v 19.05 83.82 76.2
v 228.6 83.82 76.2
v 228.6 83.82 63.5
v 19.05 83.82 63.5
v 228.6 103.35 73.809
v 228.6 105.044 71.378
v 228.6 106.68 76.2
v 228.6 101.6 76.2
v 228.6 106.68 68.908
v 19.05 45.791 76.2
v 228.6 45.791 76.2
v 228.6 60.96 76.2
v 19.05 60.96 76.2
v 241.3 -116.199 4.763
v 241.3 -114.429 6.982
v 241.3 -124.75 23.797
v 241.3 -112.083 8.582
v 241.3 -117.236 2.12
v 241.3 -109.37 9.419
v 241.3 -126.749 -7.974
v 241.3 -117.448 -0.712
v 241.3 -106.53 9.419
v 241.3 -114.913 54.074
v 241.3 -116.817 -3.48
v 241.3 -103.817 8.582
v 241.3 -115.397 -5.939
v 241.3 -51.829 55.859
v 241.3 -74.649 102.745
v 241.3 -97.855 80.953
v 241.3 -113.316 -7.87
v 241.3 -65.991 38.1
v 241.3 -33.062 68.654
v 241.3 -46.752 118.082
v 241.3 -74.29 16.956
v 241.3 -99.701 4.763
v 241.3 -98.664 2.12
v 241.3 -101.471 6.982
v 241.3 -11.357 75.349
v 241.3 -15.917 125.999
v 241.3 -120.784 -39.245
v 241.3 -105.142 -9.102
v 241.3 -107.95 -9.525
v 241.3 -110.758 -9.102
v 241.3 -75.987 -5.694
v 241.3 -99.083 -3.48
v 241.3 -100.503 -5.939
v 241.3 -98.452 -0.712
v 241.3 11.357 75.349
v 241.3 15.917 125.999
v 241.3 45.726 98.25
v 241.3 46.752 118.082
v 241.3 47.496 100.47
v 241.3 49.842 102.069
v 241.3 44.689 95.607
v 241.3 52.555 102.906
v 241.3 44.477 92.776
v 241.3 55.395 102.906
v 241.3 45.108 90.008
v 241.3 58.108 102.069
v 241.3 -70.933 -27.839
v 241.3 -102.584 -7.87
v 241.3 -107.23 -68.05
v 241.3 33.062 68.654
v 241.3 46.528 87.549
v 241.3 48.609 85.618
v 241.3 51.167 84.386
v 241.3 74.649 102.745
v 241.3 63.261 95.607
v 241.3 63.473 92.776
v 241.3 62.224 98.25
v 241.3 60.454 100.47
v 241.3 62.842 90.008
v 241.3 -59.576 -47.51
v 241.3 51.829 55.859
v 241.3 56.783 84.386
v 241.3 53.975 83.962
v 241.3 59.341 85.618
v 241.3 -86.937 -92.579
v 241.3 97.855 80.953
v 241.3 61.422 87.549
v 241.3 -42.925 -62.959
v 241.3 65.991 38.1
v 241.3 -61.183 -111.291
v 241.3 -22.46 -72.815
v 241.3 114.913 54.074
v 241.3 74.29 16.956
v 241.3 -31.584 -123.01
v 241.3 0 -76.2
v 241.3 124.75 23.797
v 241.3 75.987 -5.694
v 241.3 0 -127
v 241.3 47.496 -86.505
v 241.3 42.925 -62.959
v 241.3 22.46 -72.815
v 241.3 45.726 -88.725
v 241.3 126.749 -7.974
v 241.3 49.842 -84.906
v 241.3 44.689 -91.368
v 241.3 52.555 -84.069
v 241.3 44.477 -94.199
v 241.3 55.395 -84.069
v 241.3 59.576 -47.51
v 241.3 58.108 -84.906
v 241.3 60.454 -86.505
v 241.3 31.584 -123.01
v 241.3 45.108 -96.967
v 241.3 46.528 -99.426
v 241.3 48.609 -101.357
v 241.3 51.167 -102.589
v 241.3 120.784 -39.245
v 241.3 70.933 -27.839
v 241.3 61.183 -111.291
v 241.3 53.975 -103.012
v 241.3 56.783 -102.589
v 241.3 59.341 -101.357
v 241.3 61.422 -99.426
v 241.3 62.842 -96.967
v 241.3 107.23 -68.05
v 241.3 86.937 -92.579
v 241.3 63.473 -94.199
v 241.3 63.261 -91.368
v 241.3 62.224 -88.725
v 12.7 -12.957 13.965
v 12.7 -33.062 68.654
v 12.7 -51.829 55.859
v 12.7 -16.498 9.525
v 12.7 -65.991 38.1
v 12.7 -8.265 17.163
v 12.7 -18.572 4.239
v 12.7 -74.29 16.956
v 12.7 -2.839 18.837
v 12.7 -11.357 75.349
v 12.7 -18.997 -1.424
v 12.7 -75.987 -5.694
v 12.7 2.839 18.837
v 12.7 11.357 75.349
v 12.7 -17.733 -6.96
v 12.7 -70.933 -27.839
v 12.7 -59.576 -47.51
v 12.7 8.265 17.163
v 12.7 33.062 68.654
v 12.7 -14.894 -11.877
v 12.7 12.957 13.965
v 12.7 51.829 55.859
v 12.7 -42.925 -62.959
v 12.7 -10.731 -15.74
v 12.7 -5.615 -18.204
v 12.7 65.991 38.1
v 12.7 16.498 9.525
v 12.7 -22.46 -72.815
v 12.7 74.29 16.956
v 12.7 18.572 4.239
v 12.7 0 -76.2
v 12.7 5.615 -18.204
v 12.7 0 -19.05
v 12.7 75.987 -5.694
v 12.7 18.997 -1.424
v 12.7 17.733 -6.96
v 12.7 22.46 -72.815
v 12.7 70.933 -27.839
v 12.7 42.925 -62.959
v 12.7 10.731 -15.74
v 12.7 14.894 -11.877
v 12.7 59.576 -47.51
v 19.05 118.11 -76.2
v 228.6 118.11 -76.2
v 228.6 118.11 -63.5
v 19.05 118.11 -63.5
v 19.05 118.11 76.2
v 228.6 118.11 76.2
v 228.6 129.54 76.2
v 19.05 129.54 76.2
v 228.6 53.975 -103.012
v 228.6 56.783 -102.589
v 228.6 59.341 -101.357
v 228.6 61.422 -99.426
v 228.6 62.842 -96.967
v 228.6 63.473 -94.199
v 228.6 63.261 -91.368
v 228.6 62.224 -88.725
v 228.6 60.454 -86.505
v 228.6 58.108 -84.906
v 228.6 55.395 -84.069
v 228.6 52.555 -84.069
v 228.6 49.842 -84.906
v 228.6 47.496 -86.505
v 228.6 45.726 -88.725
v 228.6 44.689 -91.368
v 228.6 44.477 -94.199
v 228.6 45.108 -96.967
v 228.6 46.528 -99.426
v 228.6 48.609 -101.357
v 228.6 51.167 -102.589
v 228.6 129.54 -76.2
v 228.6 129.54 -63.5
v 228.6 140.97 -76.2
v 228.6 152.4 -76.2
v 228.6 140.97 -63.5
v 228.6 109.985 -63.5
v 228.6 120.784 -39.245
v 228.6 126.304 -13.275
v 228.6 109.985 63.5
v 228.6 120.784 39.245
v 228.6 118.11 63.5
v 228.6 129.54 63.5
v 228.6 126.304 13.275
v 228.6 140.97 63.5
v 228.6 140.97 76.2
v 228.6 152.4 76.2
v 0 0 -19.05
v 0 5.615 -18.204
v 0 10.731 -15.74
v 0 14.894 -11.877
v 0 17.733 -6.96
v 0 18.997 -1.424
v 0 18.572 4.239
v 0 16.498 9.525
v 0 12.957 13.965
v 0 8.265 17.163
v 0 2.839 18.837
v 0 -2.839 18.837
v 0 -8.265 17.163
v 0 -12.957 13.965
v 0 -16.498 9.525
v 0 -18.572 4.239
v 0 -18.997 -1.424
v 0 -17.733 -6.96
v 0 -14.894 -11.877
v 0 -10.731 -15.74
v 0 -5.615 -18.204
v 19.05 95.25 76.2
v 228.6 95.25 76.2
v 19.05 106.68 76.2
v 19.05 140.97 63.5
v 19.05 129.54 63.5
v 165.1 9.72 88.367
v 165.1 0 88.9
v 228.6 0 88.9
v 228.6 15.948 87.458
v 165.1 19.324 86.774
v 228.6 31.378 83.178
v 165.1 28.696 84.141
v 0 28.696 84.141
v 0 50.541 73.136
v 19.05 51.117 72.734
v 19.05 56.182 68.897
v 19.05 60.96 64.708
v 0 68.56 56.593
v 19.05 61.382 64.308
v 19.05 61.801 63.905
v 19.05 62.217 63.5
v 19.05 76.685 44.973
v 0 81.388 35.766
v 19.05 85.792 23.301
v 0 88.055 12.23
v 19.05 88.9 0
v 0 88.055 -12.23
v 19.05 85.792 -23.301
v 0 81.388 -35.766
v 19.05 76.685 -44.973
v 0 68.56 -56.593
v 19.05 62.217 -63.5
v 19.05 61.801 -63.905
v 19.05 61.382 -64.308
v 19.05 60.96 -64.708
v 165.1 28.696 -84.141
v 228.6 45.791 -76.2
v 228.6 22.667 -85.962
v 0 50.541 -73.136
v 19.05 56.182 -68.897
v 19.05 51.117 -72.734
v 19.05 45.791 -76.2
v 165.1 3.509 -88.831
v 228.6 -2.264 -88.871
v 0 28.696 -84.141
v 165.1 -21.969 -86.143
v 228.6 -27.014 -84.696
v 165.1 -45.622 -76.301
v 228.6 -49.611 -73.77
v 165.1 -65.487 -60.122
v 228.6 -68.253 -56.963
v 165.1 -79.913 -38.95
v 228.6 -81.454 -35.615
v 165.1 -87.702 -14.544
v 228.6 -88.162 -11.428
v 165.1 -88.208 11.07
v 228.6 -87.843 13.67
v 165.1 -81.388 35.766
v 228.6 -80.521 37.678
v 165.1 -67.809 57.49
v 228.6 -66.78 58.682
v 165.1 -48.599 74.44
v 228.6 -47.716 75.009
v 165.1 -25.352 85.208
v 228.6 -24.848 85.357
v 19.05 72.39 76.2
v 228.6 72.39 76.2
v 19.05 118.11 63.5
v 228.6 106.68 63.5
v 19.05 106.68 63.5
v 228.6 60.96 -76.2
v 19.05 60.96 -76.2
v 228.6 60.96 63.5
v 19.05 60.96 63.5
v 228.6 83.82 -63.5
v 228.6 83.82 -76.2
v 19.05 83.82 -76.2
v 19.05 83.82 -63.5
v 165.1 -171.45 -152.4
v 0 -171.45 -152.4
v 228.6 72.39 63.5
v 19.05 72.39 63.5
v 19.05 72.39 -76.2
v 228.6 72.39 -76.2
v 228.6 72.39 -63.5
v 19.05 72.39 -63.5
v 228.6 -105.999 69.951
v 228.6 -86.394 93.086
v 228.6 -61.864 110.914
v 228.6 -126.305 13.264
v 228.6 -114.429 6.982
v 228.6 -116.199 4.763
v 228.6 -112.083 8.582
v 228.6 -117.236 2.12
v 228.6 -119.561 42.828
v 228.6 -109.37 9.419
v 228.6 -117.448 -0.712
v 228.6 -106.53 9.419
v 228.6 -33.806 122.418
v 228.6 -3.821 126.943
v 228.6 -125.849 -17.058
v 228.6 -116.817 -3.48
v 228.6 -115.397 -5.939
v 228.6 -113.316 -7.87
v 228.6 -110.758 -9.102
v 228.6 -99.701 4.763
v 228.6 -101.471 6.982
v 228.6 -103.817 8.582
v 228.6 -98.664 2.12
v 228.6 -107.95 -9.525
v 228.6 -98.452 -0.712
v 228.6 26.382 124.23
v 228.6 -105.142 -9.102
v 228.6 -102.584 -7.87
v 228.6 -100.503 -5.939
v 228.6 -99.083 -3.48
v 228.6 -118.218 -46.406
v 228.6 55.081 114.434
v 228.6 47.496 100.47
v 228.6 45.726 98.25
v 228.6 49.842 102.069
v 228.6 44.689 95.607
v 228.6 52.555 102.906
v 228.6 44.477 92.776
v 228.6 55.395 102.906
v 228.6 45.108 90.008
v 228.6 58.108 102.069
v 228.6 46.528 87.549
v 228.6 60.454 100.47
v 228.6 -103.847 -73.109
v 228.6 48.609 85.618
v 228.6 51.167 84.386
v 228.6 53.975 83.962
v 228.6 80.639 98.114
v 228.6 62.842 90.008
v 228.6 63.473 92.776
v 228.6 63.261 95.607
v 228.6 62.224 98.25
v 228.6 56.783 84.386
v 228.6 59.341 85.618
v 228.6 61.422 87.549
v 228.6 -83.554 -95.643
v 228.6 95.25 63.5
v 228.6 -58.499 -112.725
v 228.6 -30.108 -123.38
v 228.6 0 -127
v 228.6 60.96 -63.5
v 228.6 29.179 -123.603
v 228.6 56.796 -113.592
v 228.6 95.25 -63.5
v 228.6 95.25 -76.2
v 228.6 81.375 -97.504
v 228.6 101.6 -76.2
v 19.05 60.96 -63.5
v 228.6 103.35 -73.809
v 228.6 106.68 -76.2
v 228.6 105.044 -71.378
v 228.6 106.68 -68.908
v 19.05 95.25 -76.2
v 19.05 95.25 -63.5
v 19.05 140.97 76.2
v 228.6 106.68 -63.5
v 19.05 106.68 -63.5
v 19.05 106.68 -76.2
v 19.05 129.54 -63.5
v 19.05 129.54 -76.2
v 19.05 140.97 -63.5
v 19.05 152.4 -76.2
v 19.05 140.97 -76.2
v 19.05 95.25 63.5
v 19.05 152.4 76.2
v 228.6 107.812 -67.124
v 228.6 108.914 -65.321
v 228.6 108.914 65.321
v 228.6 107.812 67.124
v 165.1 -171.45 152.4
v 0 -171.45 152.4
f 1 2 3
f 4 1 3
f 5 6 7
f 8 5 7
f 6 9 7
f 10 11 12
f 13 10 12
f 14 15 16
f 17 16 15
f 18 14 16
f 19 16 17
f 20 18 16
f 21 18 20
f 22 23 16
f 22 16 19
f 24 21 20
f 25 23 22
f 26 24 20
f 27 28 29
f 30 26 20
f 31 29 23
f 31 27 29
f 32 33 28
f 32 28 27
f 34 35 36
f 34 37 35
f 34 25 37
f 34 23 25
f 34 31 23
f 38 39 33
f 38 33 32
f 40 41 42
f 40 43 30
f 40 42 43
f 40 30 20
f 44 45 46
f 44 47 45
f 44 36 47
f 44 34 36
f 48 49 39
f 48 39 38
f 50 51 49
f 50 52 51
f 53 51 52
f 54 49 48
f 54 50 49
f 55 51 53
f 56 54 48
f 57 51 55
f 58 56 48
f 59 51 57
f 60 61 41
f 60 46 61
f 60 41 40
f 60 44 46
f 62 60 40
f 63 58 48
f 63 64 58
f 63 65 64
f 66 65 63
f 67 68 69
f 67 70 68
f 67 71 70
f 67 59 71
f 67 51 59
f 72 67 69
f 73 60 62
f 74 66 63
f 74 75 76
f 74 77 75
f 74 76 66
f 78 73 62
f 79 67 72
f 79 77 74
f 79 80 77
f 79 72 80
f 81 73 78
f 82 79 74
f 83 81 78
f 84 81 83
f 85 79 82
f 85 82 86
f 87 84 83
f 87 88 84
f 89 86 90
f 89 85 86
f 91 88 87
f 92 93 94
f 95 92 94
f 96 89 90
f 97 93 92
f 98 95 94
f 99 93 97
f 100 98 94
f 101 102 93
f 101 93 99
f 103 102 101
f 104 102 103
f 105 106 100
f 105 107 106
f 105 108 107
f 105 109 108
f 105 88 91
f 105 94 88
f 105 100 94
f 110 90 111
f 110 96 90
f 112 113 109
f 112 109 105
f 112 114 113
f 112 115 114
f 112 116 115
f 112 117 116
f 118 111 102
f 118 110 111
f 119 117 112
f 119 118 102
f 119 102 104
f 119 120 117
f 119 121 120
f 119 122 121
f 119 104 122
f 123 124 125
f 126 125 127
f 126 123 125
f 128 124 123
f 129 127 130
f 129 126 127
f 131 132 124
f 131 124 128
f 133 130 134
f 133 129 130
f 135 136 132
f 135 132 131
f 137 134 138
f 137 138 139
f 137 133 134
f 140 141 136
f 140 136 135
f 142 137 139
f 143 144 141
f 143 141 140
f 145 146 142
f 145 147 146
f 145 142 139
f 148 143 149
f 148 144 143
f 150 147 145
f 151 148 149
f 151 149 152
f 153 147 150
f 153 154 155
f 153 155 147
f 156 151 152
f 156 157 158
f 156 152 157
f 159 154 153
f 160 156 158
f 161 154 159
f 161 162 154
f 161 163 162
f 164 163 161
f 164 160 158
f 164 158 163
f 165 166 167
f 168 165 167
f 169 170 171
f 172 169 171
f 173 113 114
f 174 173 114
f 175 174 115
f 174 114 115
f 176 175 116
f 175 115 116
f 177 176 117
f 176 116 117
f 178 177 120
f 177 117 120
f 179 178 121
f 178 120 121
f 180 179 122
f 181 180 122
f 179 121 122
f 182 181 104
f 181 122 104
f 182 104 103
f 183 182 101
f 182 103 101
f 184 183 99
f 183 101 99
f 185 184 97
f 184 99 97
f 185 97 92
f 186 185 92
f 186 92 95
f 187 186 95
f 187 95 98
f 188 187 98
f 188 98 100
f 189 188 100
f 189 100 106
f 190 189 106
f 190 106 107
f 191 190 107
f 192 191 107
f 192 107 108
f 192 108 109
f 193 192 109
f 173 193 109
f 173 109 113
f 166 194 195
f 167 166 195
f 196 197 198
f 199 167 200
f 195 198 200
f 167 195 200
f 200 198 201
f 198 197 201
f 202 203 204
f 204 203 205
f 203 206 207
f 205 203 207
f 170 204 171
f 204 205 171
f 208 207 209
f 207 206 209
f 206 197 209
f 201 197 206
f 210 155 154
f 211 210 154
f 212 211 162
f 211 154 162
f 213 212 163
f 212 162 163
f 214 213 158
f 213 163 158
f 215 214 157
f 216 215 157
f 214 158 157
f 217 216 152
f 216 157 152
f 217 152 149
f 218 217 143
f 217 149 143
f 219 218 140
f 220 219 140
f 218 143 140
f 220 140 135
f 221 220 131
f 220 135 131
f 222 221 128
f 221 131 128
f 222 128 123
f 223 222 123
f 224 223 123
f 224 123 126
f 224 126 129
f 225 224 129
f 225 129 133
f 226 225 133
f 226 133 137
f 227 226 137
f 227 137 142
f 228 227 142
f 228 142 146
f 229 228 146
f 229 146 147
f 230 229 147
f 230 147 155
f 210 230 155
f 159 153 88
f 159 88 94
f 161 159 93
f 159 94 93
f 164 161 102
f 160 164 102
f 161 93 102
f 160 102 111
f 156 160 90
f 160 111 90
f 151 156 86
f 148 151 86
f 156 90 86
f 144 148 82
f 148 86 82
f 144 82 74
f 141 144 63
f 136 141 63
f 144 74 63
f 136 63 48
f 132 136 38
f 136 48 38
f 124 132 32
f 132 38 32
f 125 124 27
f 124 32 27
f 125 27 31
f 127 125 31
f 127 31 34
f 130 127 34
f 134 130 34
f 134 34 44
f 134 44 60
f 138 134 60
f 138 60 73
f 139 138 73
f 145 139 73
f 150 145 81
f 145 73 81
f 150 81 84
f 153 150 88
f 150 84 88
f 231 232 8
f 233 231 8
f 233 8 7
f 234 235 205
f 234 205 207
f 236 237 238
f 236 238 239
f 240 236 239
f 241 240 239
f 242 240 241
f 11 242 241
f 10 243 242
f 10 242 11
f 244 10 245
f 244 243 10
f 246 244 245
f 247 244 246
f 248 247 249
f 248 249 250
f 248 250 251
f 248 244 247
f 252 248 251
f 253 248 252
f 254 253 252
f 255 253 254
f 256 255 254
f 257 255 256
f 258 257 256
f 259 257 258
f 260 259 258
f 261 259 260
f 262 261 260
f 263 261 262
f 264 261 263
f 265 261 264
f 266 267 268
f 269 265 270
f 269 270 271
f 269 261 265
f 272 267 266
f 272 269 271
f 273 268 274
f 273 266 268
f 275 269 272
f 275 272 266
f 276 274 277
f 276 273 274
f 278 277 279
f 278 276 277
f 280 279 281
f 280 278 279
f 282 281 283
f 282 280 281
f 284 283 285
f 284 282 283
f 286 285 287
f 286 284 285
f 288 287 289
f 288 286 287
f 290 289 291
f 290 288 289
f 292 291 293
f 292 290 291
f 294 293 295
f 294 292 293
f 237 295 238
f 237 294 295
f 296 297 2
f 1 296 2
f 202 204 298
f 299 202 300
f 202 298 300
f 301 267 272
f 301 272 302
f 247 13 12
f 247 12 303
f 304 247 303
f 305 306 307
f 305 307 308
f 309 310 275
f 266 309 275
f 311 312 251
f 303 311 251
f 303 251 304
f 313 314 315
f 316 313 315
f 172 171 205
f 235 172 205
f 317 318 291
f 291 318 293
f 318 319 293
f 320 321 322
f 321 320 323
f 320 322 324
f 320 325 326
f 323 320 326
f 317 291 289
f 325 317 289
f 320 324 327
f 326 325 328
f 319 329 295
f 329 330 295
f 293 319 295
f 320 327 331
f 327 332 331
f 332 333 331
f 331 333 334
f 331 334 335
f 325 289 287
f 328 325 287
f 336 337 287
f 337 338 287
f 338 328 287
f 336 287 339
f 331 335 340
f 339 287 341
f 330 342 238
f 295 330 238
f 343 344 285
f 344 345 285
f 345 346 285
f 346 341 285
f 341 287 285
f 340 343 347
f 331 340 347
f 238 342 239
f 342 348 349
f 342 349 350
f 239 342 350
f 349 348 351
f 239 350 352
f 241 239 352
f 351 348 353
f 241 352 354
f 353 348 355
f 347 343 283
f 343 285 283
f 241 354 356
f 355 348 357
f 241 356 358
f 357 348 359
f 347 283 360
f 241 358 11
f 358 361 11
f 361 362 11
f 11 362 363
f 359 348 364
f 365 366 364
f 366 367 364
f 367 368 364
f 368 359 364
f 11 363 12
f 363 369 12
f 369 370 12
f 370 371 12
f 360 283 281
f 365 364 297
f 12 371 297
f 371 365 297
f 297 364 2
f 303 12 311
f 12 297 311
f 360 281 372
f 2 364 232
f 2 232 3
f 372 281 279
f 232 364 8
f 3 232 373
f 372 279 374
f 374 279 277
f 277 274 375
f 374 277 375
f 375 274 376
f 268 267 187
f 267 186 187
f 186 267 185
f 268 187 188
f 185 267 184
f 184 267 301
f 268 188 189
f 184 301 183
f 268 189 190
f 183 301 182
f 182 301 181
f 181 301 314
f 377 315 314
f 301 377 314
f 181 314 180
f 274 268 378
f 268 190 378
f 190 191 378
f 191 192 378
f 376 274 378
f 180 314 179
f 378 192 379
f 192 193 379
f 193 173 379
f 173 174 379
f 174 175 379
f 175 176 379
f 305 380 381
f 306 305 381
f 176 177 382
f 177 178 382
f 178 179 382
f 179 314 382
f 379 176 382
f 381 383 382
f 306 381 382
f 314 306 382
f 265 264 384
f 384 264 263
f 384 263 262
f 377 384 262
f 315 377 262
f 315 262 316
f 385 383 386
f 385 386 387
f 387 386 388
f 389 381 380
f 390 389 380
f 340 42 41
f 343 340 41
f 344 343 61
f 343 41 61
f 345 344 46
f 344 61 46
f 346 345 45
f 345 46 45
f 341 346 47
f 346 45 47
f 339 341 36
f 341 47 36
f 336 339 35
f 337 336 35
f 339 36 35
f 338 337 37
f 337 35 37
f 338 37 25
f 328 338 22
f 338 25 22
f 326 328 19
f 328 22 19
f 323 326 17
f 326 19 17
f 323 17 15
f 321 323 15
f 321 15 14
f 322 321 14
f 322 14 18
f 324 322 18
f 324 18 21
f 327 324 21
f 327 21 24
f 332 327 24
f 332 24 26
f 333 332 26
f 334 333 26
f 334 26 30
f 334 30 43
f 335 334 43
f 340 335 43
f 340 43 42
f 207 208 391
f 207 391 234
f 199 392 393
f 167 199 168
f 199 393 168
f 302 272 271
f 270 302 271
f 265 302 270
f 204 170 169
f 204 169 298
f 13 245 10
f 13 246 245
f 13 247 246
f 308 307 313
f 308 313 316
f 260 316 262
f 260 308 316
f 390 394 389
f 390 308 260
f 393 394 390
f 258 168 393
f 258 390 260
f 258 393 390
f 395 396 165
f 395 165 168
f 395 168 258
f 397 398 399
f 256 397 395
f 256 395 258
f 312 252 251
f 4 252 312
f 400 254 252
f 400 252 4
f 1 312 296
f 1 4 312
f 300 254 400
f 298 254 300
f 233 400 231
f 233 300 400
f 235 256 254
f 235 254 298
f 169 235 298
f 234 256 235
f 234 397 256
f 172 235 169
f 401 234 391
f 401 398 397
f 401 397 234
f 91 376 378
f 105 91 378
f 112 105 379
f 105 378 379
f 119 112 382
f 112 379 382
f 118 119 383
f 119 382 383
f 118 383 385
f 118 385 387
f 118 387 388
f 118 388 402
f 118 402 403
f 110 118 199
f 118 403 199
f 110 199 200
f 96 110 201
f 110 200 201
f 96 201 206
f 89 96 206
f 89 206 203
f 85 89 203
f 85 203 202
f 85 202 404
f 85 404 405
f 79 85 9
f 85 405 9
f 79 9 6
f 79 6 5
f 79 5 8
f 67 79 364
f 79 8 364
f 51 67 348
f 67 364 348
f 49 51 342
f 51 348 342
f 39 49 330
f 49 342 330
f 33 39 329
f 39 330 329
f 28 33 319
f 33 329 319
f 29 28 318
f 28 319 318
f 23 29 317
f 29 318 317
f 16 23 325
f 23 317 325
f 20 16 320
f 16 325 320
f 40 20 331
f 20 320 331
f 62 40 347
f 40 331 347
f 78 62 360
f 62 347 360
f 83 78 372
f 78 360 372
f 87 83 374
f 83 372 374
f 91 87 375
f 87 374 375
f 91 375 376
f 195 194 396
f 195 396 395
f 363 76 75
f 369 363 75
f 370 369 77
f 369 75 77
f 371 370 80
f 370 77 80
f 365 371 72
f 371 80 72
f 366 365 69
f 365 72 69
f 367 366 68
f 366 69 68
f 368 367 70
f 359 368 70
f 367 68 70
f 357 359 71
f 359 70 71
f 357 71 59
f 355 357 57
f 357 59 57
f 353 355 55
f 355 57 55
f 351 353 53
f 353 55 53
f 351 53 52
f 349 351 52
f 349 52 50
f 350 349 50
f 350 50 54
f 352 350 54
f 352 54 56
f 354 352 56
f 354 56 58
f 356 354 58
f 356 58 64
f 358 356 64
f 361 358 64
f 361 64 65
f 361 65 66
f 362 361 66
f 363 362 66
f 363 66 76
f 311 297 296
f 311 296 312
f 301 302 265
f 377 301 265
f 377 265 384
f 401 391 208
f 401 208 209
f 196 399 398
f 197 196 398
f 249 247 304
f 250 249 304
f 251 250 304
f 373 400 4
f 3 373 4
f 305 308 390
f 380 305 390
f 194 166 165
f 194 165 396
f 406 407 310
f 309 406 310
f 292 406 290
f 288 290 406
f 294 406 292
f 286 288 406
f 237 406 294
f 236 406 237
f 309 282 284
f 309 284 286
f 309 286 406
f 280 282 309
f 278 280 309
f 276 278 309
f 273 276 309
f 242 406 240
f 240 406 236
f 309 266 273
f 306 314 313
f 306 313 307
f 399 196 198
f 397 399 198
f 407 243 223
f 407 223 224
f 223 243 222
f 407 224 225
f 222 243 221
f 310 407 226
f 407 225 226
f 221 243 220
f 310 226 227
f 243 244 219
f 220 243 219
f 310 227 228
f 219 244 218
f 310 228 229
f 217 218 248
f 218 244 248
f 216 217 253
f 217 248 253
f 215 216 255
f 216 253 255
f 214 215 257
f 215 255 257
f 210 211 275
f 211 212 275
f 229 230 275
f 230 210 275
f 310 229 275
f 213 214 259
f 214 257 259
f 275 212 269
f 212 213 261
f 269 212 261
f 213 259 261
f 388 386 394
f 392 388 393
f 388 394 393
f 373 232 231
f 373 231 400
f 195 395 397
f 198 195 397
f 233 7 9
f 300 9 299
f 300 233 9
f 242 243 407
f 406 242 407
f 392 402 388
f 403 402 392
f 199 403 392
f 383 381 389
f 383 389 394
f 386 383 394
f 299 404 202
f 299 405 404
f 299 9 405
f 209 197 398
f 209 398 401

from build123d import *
from build123d.topology import SkipClean

# Parameters (mm, degrees)
BOSS_EXTRUDE1_DEPTH     = 165.1
SKETCH2_R               = 88.9
BOSS_EXTRUDE2_DEPTH     = 228.6
SKETCH3_R               = 127
BOSS_EXTRUDE3_DEPTH     = 12.7
SKETCH4_W               = 152.4
SKETCH4_H               = 152.4
BOSS_EXTRUDE4_DEPTH     = 209.55
SKETCH5_W               = 25.4
SKETCH5_H               = 11.43
CUT_EXTRUDE1_DEPTH      = 209.55
LPATTERN1_COUNT         = 4
LPATTERN1_PITCH         = 22.86
MIRROR1_COPY_1_SKETCH_W = 25.4
MIRROR1_COPY_1_SKETCH_H = 11.43
MIRROR1_COPY_1_DEPTH    = 209.55
MIRROR1_COPY_2_SKETCH_W = 25.4
MIRROR1_COPY_2_SKETCH_H = 11.43
MIRROR1_COPY_2_DEPTH    = 209.55
MIRROR1_COPY_3_SKETCH_W = 25.4
MIRROR1_COPY_3_SKETCH_H = 11.43
MIRROR1_COPY_3_DEPTH    = 209.55
SKETCH7_R               = 76.2
CUT_EXTRUDE2_DEPTH      = 228.6
SKETCH8_R               = 19.05
CUT_EXTRUDE3_DEPTH      = 228.6
SKETCH9_R               = 9.525
CUT_EXTRUDE5_DEPTH      = 50.8


with BuildPart() as part:
    # Sketch1 → Boss-Extrude1 (new body)
    with BuildSketch(Plane(origin=(0, 0, 0), x_dir=(0, 0, -1), z_dir=(1, 0, 0))):
        with BuildLine():
            Line((-152.4, -171.45), (152.4, -171.45))
            Line((152.4, -171.45), (84.14126771, 28.695941668))
            ThreePointArc((84.14126771, 28.695941668), (0, 88.9), (-84.14126771, 28.695941668))
            Line((-84.14126771, 28.695941668), (-152.4, -171.45))
        make_face()
    extrude(amount=BOSS_EXTRUDE1_DEPTH)

    # Sketch2 → Boss-Extrude2 (add)
    with SkipClean():  # the faces are left unmerged after this step: merging them gives an invalid solid
        with BuildSketch(Plane.ZY):
            Circle(SKETCH2_R)
        extrude(amount=-BOSS_EXTRUDE2_DEPTH)

    # Sketch3 → Boss-Extrude3 (add)
    with BuildSketch(Plane(origin=(228.6, 0, 0), x_dir=(0, 0, -1), z_dir=(1, 0, 0))):
        Circle(SKETCH3_R)
    extrude(amount=BOSS_EXTRUDE3_DEPTH)

    # Sketch4 → Boss-Extrude4 (add)
    with BuildSketch(Plane.ZY.offset(-228.6)):
        with Locations((0, 76.2)):
            Rectangle(SKETCH4_W, SKETCH4_H)
    extrude(amount=BOSS_EXTRUDE4_DEPTH)

    # Sketch5 → Cut-Extrude1 (cut)
    with BuildSketch(Plane.ZY.offset(-19.05)):
        with Locations((-76.2, 135.255)):
            Rectangle(SKETCH5_W, SKETCH5_H)
    cut_extrude1 = extrude(amount=-CUT_EXTRUDE1_DEPTH, mode=Mode.SUBTRACT)

    # LPattern1: Cut-Extrude1 ×4
    with Locations(*[(0, -i * LPATTERN1_PITCH, 0) for i in range(1, LPATTERN1_COUNT)]):
        add(cut_extrude1, mode=Mode.SUBTRACT)

    # Mirror1: Cut-Extrude1 across plane
    add(cut_extrude1.mirror(Plane.XY), mode=Mode.SUBTRACT)

    # Mirror1 copy 1 sketch → Mirror1 copy 1 (cut)
    with BuildSketch(Plane(origin=(19.05, -22.86, 0), x_dir=(0, 0, -1), z_dir=(-1, 0, 0))):
        with Locations((-76.2, -135.255)):
            Rectangle(MIRROR1_COPY_1_SKETCH_W, MIRROR1_COPY_1_SKETCH_H)
    extrude(amount=-MIRROR1_COPY_1_DEPTH, mode=Mode.SUBTRACT)

    # Mirror1 copy 2 sketch → Mirror1 copy 2 (cut)
    with BuildSketch(Plane(origin=(19.05, -45.72, 0), x_dir=(0, 0, -1), z_dir=(-1, 0, 0))):
        with Locations((-76.2, -135.255)):
            Rectangle(MIRROR1_COPY_2_SKETCH_W, MIRROR1_COPY_2_SKETCH_H)
    extrude(amount=-MIRROR1_COPY_2_DEPTH, mode=Mode.SUBTRACT)

    # Mirror1 copy 3 sketch → Mirror1 copy 3 (cut)
    with BuildSketch(Plane(origin=(19.05, -68.58, 0), x_dir=(0, 0, -1), z_dir=(-1, 0, 0))):
        with Locations((-76.2, -135.255)):
            Rectangle(MIRROR1_COPY_3_SKETCH_W, MIRROR1_COPY_3_SKETCH_H)
    extrude(amount=-MIRROR1_COPY_3_DEPTH, mode=Mode.SUBTRACT)

    # Sketch7 → Cut-Extrude2 (cut)
    with BuildSketch(Plane(origin=(241.3, 0, 0), x_dir=(0, 0, -1), z_dir=(1, 0, 0))):
        Circle(SKETCH7_R)
    extrude(amount=-CUT_EXTRUDE2_DEPTH, mode=Mode.SUBTRACT)

    # Sketch8 → Cut-Extrude3 (cut)
    with BuildSketch(Plane(origin=(12.7, 0, 0), x_dir=(0, 0, -1), z_dir=(1, 0, 0))):
        Circle(SKETCH8_R)
    extrude(amount=-CUT_EXTRUDE3_DEPTH, mode=Mode.SUBTRACT)

    # Sketch9 → Cut-Extrude5 (cut)
    with BuildSketch(Plane(origin=(241.3, 0, 0), x_dir=(0, 0, -1), z_dir=(1, 0, 0))):
        with Locations((0, -107.95)):
            Circle(SKETCH9_R)
        with Locations((-93.487442339, 53.975)):
            Circle(SKETCH9_R)
        with Locations((93.487442339, 53.975)):
            Circle(SKETCH9_R)
    extrude(amount=-CUT_EXTRUDE5_DEPTH, mode=Mode.SUBTRACT)


solid = part.part
